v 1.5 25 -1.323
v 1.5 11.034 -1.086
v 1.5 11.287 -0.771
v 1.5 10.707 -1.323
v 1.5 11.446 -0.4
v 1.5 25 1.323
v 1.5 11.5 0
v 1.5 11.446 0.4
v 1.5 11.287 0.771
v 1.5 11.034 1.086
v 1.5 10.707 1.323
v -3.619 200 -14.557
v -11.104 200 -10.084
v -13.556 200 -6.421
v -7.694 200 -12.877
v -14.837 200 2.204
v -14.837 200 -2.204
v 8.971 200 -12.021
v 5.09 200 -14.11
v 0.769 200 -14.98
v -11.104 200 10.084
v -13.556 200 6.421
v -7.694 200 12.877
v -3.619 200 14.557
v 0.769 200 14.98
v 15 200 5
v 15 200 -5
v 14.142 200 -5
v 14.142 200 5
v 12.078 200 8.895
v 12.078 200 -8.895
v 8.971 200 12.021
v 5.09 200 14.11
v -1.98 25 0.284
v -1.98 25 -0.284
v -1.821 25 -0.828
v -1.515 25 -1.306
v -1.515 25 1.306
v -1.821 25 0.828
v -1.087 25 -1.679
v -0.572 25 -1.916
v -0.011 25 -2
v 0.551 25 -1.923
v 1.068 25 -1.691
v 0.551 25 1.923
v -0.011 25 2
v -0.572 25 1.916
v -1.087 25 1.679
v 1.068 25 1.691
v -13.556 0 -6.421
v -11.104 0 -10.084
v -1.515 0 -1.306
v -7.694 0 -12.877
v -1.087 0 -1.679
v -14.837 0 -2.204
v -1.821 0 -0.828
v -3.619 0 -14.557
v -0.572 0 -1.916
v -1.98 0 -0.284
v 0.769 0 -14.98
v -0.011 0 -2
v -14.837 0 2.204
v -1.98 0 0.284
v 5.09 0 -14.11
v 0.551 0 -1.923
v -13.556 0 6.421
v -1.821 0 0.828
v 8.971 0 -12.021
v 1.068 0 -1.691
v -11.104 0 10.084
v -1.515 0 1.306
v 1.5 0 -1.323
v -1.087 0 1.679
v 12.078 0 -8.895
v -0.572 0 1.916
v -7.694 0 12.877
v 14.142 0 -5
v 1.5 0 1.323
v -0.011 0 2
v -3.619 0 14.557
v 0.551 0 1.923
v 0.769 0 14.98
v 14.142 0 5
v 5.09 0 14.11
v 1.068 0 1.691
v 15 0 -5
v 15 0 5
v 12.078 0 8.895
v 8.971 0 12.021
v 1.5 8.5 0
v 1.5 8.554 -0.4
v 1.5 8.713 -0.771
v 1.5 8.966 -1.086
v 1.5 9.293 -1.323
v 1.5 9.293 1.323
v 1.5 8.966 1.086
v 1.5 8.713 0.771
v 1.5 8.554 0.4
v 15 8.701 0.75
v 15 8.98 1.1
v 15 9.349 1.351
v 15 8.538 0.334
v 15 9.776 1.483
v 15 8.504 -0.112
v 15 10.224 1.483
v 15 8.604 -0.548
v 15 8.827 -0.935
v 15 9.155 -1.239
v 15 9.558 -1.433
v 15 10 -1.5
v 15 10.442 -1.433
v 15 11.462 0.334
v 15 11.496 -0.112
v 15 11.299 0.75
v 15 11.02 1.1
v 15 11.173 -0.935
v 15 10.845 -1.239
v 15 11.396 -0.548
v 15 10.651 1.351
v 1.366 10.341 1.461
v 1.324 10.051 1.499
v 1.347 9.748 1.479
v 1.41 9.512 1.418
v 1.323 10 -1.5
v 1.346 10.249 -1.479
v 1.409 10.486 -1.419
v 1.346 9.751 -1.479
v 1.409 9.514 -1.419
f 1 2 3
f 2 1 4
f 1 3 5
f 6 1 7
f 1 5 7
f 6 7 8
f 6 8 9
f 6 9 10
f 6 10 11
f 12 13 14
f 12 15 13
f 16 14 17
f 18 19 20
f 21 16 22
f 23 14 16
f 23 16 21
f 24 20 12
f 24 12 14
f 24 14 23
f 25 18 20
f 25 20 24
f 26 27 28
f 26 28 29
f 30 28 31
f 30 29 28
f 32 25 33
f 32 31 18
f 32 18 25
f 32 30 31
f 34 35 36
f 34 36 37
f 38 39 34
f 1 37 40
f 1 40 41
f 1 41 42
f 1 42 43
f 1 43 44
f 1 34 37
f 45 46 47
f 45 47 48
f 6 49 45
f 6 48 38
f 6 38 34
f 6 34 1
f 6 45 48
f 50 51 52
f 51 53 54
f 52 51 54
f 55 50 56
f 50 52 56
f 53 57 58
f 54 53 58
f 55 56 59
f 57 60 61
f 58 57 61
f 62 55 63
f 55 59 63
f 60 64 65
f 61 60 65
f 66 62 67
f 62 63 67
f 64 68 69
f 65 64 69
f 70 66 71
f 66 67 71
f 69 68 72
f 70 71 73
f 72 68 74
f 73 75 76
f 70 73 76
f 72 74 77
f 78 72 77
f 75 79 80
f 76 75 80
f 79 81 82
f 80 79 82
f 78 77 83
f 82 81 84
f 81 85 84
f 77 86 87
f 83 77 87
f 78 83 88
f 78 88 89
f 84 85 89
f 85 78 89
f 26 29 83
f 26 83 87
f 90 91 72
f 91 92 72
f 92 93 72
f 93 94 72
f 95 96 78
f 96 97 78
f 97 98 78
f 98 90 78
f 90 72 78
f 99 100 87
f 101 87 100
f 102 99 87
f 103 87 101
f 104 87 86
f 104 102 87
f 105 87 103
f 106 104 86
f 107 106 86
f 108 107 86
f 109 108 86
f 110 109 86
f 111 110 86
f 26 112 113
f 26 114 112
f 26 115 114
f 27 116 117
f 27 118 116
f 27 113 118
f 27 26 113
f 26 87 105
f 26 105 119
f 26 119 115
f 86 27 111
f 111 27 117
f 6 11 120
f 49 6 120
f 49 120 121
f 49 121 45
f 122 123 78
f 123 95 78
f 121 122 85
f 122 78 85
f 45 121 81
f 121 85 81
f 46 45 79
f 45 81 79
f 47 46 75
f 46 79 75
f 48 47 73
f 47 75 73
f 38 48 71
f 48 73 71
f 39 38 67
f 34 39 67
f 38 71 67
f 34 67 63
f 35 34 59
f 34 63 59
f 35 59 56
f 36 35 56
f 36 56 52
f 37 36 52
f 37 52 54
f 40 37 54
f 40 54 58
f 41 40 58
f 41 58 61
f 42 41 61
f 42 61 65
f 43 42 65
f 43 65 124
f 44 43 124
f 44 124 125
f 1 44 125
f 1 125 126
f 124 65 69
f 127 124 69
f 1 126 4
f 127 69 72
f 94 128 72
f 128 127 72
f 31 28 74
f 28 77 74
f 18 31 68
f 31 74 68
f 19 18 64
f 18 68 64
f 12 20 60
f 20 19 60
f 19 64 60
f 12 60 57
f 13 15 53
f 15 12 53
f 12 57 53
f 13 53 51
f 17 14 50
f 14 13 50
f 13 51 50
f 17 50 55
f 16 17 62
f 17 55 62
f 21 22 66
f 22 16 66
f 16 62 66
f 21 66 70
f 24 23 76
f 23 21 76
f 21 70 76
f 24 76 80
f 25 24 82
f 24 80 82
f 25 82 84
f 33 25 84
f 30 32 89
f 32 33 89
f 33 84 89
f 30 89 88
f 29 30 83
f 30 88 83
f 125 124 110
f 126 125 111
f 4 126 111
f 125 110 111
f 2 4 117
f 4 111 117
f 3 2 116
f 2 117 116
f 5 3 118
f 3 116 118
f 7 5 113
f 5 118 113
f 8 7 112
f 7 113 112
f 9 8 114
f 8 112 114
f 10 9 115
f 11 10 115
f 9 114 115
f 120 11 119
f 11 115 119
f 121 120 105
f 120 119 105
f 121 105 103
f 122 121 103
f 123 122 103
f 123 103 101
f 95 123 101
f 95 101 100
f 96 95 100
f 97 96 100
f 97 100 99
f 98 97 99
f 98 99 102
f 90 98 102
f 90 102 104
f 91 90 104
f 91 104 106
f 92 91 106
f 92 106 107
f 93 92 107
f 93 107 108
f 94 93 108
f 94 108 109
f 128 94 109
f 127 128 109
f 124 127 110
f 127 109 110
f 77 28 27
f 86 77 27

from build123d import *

# Parameters (mm, degrees)
SKETCH1_R           = 15
BOSS_EXTRUDE1_DEPTH = 200
SKETCH2_W           = 0.857864376
SKETCH2_H           = 10
BOSS_EXTRUDE2_DEPTH = 200
CUT_EXTRUDE1_DEPTH  = 25
SKETCH4_R           = 1.5
CUT_EXTRUDE2_DEPTH  = 15


with BuildPart() as part:
    # Sketch1 → Boss-Extrude1 (new body)
    with BuildSketch(Plane(origin=(0, 0, 0), x_dir=(1, 0, 0), z_dir=(0, 1, 0))):
        with Locations(Location((0, 0, 0), (0, 0, 270))):
            Circle(SKETCH1_R)
    extrude(amount=BOSS_EXTRUDE1_DEPTH)

    # Sketch2 → Boss-Extrude2 (add)
    with BuildSketch(Plane(origin=(0, 200, 0), x_dir=(1, 0, 0), z_dir=(0, 1, 0))):
        with Locations((14.571067812, 0)):
            Rectangle(SKETCH2_W, SKETCH2_H)
    extrude(amount=-BOSS_EXTRUDE2_DEPTH)

    # Sketch3 → Cut-Extrude1 (cut)
    with BuildSketch(Plane.XZ):
        with BuildLine():
            Line((1.5, -1.322875656), (1.5, 1.322875656))
            ThreePointArc((1.5, 1.322875656), (-2, 0), (1.5, -1.322875656))
        make_face()
    extrude(amount=-CUT_EXTRUDE1_DEPTH, mode=Mode.SUBTRACT)

    # Sketch4 → Cut-Extrude2 (cut)
    with BuildSketch(Plane(origin=(15, 0, 0), x_dir=(0, 0, -1), z_dir=(1, 0, 0))):
        with Locations((0, 10)):
            Circle(SKETCH4_R)
    extrude(amount=-CUT_EXTRUDE2_DEPTH, mode=Mode.SUBTRACT)


solid = part.part
